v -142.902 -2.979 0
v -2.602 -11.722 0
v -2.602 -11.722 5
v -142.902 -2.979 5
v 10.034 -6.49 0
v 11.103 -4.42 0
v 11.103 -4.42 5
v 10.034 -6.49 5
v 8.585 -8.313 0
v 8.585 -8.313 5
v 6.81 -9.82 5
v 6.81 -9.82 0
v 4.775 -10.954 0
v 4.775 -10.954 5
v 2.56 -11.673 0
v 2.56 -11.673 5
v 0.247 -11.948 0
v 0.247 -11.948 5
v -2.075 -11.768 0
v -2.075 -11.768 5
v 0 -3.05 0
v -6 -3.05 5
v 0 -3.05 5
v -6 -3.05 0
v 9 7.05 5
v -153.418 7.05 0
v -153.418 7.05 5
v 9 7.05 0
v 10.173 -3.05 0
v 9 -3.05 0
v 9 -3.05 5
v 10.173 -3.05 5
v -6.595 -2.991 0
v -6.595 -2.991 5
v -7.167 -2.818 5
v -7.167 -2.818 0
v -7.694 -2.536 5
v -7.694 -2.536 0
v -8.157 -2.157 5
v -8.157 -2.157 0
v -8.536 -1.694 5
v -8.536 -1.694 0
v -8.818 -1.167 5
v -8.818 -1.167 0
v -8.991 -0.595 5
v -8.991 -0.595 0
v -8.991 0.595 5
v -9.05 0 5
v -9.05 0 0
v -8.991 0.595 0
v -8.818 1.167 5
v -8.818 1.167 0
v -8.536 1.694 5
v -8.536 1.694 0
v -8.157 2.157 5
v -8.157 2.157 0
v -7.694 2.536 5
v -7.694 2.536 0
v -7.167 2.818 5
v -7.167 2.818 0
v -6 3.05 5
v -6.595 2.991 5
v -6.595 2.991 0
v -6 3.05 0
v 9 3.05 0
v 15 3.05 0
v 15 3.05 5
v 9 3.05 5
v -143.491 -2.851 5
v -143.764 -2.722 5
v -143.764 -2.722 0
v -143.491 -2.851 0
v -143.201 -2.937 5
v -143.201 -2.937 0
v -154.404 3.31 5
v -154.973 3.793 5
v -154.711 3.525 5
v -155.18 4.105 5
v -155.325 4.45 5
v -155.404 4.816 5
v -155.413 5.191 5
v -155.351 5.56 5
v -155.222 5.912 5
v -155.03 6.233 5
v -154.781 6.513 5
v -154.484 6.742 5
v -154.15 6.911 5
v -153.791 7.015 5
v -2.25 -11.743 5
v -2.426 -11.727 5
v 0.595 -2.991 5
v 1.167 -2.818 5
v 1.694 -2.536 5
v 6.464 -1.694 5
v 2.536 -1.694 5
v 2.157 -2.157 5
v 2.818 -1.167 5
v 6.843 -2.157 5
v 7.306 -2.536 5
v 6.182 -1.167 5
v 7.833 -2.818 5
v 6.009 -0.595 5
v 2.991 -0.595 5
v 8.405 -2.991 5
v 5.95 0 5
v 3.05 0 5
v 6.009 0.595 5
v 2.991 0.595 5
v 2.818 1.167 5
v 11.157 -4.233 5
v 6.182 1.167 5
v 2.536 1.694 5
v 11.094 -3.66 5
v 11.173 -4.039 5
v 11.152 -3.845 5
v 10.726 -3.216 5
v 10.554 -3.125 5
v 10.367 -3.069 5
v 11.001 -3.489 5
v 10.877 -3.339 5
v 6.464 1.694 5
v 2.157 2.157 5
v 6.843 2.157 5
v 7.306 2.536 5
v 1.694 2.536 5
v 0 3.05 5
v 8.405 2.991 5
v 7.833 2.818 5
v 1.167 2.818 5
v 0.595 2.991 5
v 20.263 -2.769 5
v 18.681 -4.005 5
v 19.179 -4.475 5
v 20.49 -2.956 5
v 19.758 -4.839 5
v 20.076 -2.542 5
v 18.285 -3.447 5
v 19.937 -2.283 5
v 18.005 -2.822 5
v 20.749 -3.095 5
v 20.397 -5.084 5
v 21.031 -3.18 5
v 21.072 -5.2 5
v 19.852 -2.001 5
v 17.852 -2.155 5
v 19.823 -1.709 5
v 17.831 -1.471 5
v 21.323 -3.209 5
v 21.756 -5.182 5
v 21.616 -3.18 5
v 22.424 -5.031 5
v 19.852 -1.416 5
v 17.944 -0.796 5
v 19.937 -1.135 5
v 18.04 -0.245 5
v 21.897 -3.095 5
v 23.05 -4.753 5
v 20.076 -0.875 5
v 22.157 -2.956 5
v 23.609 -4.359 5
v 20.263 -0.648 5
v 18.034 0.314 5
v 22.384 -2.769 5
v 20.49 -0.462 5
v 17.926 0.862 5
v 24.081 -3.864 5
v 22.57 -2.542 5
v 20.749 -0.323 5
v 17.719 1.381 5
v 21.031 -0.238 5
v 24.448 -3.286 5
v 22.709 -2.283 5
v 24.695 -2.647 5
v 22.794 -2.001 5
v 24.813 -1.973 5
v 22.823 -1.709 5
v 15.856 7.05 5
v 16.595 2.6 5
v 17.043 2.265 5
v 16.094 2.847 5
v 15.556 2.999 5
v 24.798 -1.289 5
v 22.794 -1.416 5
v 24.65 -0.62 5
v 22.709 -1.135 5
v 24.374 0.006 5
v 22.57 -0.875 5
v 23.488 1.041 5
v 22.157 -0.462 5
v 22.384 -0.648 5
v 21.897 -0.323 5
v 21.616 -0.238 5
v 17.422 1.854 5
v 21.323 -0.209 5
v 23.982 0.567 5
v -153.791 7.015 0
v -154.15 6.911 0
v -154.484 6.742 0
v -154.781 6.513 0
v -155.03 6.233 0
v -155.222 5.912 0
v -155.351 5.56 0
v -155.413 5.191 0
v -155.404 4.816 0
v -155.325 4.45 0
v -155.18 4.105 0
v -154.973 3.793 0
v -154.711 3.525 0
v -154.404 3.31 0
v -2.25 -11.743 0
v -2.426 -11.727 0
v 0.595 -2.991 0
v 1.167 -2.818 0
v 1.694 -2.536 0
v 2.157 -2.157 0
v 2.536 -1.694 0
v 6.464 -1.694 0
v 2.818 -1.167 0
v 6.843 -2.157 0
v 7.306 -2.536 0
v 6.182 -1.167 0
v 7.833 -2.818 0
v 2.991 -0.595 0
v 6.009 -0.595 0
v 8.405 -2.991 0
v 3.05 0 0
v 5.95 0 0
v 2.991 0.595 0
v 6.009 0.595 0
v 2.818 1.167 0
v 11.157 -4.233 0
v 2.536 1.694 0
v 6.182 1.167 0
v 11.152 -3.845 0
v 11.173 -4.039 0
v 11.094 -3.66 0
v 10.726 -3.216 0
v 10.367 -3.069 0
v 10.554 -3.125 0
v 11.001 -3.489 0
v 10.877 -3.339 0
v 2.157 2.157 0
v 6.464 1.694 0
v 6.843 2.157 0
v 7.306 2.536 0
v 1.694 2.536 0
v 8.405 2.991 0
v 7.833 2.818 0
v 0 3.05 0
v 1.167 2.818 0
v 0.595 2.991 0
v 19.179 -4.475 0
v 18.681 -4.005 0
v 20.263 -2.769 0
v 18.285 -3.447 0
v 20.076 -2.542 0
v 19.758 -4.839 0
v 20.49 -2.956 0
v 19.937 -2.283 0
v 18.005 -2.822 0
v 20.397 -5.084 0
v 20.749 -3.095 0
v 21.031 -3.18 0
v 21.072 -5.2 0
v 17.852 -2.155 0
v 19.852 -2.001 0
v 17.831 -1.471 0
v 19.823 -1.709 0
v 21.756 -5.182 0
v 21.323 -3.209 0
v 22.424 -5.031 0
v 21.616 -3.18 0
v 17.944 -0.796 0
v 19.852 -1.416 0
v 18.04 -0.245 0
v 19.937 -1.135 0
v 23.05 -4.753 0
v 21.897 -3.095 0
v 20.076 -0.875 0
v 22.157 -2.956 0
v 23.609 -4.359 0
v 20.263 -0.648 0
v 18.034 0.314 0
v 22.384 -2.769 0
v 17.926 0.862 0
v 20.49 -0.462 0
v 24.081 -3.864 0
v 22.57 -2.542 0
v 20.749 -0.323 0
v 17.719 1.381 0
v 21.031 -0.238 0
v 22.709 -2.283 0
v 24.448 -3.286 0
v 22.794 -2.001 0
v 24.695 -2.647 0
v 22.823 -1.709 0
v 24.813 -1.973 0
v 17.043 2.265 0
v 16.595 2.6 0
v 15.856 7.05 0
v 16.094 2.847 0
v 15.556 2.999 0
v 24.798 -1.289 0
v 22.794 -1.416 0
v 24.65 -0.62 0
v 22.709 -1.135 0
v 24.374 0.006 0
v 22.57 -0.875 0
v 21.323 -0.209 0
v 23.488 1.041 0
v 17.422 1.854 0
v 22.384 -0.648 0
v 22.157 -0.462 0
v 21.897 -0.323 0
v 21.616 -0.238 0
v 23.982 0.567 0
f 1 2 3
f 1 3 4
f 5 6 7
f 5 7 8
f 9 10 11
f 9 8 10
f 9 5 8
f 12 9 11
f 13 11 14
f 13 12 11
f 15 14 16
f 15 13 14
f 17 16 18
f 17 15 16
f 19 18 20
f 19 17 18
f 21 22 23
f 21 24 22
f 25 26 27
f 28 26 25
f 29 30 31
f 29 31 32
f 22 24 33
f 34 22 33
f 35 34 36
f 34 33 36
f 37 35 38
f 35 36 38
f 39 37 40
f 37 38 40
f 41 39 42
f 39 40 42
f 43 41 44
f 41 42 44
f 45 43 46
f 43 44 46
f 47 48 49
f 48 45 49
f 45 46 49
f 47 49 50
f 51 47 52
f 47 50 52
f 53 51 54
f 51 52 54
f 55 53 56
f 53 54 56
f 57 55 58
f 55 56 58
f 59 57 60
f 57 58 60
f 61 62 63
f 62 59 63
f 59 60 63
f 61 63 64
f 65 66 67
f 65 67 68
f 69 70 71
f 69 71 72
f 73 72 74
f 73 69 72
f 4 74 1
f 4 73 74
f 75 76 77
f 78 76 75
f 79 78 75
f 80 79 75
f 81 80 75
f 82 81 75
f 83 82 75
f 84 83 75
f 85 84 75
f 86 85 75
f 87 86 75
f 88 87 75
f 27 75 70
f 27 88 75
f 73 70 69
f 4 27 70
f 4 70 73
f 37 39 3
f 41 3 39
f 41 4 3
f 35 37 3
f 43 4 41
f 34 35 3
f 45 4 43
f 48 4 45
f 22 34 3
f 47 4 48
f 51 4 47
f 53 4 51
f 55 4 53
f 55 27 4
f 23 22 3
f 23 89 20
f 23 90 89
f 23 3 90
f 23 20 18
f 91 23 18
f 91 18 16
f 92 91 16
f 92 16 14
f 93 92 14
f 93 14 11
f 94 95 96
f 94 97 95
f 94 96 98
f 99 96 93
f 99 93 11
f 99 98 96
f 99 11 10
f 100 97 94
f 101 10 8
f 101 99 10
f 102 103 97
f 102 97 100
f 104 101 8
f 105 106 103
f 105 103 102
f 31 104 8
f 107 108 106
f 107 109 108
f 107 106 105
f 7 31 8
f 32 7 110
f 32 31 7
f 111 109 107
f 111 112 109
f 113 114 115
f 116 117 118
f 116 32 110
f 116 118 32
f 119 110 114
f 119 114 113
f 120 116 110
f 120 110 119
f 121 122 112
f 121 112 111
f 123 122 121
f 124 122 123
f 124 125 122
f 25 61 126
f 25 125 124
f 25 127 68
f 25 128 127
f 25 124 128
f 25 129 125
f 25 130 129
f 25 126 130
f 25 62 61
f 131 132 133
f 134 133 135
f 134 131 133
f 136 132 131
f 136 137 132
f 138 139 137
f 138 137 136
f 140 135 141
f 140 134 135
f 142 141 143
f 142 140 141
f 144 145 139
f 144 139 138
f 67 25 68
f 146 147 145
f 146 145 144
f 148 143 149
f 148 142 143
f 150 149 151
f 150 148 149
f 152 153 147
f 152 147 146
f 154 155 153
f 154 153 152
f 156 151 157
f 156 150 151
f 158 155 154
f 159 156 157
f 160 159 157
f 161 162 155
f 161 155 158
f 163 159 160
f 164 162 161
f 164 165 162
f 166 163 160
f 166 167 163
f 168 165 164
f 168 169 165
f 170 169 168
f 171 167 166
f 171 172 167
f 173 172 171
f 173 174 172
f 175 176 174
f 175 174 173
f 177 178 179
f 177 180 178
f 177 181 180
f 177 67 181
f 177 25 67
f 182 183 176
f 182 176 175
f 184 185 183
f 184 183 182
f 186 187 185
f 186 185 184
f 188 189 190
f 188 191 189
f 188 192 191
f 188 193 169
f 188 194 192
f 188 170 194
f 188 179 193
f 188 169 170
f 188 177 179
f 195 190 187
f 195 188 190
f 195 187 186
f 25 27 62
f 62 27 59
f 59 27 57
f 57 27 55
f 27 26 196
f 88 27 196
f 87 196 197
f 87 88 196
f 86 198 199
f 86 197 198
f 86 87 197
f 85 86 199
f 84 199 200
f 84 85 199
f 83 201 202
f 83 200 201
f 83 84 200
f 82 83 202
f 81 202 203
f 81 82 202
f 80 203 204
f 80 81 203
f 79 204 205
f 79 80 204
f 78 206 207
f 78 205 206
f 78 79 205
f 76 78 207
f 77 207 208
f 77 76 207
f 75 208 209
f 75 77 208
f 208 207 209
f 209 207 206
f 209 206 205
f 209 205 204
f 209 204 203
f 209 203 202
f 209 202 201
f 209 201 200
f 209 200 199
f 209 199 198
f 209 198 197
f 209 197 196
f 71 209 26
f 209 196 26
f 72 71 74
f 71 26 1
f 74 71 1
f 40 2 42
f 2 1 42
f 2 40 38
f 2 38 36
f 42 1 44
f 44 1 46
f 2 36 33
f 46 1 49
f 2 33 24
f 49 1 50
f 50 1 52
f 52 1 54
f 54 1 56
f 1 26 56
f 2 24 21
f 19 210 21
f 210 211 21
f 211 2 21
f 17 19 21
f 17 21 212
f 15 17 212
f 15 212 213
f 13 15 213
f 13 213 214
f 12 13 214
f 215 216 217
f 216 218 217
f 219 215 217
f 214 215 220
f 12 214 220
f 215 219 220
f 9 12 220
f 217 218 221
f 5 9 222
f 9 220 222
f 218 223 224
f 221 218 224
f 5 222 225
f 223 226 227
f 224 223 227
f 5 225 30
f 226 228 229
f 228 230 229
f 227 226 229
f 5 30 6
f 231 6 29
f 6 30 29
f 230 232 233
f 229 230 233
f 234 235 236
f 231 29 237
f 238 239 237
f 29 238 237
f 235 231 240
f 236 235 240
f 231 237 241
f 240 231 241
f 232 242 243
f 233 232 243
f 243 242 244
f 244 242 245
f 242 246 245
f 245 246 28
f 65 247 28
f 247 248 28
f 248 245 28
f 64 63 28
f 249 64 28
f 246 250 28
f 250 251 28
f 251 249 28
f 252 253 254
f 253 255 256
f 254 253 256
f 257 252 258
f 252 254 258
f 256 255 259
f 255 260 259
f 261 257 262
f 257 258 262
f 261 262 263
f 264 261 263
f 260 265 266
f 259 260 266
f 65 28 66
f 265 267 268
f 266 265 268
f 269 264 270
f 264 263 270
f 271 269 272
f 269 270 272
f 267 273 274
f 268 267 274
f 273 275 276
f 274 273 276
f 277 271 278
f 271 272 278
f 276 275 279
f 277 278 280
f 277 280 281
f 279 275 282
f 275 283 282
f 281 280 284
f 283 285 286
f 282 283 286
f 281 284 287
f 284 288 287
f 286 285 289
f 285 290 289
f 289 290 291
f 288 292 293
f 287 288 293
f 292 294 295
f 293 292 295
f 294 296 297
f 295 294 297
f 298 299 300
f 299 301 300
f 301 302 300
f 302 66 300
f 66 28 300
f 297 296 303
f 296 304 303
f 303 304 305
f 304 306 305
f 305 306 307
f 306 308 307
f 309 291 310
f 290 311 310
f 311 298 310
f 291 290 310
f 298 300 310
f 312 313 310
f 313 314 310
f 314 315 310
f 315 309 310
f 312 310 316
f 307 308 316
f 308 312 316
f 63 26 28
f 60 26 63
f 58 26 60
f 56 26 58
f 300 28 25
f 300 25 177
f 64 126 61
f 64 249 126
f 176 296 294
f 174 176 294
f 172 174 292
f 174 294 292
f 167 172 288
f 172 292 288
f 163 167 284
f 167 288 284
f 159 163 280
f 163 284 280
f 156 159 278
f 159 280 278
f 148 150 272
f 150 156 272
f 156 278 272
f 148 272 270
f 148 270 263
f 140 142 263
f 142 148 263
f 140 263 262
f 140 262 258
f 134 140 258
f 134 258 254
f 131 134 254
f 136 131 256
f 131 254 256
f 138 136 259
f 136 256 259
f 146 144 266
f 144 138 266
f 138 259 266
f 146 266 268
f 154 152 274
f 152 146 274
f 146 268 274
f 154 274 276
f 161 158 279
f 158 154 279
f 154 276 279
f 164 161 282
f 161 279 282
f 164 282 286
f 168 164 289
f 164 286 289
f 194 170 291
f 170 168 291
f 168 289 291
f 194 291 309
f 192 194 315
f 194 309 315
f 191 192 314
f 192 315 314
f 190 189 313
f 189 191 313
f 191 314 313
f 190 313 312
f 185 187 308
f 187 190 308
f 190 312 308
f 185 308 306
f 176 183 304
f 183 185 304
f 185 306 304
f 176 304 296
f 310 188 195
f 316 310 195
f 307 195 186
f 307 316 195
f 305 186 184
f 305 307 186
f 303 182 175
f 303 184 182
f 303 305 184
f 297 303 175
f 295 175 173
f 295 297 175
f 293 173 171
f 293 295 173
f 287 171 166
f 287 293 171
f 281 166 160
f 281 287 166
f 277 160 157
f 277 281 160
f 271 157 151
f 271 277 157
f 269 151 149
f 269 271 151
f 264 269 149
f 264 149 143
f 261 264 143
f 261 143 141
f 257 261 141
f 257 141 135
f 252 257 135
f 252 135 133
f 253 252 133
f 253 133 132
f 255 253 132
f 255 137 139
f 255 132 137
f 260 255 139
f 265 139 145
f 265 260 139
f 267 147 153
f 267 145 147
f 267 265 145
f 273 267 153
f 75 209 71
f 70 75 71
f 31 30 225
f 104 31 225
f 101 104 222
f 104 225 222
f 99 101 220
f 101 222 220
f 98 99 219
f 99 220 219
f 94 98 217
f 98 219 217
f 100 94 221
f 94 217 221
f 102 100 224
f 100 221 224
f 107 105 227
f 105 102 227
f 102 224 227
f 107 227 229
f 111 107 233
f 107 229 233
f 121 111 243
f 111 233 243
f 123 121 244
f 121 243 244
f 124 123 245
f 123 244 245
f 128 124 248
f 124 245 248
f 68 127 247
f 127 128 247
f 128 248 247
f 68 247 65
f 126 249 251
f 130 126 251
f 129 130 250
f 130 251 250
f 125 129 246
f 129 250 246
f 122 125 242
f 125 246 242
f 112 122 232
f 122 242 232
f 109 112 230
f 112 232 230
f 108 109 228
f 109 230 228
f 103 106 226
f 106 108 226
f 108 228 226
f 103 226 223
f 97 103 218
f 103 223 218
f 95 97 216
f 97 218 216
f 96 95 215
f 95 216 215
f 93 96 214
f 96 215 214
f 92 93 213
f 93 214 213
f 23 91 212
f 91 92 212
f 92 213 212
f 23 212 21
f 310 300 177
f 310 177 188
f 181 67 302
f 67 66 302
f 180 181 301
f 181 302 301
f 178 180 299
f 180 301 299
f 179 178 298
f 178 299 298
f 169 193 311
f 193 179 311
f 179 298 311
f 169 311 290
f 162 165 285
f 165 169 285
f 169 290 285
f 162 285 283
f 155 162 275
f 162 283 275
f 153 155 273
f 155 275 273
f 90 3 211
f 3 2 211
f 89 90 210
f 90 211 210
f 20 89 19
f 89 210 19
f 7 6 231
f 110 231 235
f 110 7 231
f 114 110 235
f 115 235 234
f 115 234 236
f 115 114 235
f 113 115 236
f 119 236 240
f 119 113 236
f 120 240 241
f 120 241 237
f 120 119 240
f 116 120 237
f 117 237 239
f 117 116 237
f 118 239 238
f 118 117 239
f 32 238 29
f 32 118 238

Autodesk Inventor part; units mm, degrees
ref_plane "YZ Plane" through (0, 0, 0) normal (1, 0, 0) x (0, 1, 0)
ref_plane "XZ Plane" through (0, 0, 0) normal (0, 1, 0) x (-1, 0, 0)
ref_plane "XY Plane" through (0, 0, 0) normal (0, 0, 1) x (1, 0, 0)
sketch "スケッチ1" plane through (0, 0, 0) normal (0, 0, 1) x (1, 0, 0)
  arc A0 (-2.6047, -14.7721) -> (15, 0) centre (0, 0) ccw construction
  arc A1 (-2.0751, -11.7685) -> (11.5542, -3.05) centre (0, 0) ccw
  arc A2 (-2.0751, -11.7685) -> (-2.602, -11.7221) centre (-2.6047, -14.7721) ccw
  line L0 (0, 0) -> (-6, 0) construction
  line L1 (0, 3.05) -> (-6, 3.05)
  line L2 (-6, -3.05) -> (0, -3.05)
  arc A3 (0, -3.05) -> (0, 3.05) centre (0, 0) ccw
  arc A4 (-6, 3.05) -> (-6, -3.05) centre (-6, 0) ccw
  line L3 (15, 0) -> (9, 0) construction
  line L4 (15, 3.05) -> (9, 3.05)
  arc A5 (9, 3.05) -> (9, -3.05) centre (9, 0) ccw
  line L5 (-161, 7.05) -> (9, 7.05)
  line L6 (-161, 7.05) -> (-143.3628, -2.95)
  line L7 (-2.602, -11.7221) -> (-143.3628, -2.95)
  arc A6 (17.9444, -0.7957) -> (15, 3.05) centre (15, 0) ccw
  line L8 (9, -3.05) -> (11.5542, -3.05)
  line L9 (14.6866, -3.05) -> (14.3582, -3.05)
  circle A7 centre (21.3232, -1.7088) radius 1.5
  arc A8 (17.9444, -0.7957) -> (23.4882, 1.0412) centre (21.3232, -1.7088) ccw
  line L10 (9, 7.05) -> (15.8557, 7.05)
  line L11 (15.8557, 7.05) -> (23.4882, 1.0412)
  point P0 (-3, 0)
  point P1 (12, 0)
  dimension "d0" = 15
  dimension "d1" = 6.1
  dimension "d2" = 6
  dimension "d3" = 6.1
  dimension "d4" = 6
  dimension "d5" = 6.1
  dimension "d6" = 100
  dimension "d8" = 4
  dimension "d9" = 10
  dimension "d17" = 3
  dimension "d19" = 2
  dimension "d20" = 170
extrude "押し出し1" add sketch "スケッチ1" along normal blind 5
fillet "フィレット1" radius 2 2 edges at (-161, 7.05, 2.5) (-143.3628, -2.95, 2.5)
fillet "フィレット3" radius 1 1 edges at (11.5542, -3.05, 2.5)
properties part number "ウイング仮" material "ポリカーボネート、クリア"
